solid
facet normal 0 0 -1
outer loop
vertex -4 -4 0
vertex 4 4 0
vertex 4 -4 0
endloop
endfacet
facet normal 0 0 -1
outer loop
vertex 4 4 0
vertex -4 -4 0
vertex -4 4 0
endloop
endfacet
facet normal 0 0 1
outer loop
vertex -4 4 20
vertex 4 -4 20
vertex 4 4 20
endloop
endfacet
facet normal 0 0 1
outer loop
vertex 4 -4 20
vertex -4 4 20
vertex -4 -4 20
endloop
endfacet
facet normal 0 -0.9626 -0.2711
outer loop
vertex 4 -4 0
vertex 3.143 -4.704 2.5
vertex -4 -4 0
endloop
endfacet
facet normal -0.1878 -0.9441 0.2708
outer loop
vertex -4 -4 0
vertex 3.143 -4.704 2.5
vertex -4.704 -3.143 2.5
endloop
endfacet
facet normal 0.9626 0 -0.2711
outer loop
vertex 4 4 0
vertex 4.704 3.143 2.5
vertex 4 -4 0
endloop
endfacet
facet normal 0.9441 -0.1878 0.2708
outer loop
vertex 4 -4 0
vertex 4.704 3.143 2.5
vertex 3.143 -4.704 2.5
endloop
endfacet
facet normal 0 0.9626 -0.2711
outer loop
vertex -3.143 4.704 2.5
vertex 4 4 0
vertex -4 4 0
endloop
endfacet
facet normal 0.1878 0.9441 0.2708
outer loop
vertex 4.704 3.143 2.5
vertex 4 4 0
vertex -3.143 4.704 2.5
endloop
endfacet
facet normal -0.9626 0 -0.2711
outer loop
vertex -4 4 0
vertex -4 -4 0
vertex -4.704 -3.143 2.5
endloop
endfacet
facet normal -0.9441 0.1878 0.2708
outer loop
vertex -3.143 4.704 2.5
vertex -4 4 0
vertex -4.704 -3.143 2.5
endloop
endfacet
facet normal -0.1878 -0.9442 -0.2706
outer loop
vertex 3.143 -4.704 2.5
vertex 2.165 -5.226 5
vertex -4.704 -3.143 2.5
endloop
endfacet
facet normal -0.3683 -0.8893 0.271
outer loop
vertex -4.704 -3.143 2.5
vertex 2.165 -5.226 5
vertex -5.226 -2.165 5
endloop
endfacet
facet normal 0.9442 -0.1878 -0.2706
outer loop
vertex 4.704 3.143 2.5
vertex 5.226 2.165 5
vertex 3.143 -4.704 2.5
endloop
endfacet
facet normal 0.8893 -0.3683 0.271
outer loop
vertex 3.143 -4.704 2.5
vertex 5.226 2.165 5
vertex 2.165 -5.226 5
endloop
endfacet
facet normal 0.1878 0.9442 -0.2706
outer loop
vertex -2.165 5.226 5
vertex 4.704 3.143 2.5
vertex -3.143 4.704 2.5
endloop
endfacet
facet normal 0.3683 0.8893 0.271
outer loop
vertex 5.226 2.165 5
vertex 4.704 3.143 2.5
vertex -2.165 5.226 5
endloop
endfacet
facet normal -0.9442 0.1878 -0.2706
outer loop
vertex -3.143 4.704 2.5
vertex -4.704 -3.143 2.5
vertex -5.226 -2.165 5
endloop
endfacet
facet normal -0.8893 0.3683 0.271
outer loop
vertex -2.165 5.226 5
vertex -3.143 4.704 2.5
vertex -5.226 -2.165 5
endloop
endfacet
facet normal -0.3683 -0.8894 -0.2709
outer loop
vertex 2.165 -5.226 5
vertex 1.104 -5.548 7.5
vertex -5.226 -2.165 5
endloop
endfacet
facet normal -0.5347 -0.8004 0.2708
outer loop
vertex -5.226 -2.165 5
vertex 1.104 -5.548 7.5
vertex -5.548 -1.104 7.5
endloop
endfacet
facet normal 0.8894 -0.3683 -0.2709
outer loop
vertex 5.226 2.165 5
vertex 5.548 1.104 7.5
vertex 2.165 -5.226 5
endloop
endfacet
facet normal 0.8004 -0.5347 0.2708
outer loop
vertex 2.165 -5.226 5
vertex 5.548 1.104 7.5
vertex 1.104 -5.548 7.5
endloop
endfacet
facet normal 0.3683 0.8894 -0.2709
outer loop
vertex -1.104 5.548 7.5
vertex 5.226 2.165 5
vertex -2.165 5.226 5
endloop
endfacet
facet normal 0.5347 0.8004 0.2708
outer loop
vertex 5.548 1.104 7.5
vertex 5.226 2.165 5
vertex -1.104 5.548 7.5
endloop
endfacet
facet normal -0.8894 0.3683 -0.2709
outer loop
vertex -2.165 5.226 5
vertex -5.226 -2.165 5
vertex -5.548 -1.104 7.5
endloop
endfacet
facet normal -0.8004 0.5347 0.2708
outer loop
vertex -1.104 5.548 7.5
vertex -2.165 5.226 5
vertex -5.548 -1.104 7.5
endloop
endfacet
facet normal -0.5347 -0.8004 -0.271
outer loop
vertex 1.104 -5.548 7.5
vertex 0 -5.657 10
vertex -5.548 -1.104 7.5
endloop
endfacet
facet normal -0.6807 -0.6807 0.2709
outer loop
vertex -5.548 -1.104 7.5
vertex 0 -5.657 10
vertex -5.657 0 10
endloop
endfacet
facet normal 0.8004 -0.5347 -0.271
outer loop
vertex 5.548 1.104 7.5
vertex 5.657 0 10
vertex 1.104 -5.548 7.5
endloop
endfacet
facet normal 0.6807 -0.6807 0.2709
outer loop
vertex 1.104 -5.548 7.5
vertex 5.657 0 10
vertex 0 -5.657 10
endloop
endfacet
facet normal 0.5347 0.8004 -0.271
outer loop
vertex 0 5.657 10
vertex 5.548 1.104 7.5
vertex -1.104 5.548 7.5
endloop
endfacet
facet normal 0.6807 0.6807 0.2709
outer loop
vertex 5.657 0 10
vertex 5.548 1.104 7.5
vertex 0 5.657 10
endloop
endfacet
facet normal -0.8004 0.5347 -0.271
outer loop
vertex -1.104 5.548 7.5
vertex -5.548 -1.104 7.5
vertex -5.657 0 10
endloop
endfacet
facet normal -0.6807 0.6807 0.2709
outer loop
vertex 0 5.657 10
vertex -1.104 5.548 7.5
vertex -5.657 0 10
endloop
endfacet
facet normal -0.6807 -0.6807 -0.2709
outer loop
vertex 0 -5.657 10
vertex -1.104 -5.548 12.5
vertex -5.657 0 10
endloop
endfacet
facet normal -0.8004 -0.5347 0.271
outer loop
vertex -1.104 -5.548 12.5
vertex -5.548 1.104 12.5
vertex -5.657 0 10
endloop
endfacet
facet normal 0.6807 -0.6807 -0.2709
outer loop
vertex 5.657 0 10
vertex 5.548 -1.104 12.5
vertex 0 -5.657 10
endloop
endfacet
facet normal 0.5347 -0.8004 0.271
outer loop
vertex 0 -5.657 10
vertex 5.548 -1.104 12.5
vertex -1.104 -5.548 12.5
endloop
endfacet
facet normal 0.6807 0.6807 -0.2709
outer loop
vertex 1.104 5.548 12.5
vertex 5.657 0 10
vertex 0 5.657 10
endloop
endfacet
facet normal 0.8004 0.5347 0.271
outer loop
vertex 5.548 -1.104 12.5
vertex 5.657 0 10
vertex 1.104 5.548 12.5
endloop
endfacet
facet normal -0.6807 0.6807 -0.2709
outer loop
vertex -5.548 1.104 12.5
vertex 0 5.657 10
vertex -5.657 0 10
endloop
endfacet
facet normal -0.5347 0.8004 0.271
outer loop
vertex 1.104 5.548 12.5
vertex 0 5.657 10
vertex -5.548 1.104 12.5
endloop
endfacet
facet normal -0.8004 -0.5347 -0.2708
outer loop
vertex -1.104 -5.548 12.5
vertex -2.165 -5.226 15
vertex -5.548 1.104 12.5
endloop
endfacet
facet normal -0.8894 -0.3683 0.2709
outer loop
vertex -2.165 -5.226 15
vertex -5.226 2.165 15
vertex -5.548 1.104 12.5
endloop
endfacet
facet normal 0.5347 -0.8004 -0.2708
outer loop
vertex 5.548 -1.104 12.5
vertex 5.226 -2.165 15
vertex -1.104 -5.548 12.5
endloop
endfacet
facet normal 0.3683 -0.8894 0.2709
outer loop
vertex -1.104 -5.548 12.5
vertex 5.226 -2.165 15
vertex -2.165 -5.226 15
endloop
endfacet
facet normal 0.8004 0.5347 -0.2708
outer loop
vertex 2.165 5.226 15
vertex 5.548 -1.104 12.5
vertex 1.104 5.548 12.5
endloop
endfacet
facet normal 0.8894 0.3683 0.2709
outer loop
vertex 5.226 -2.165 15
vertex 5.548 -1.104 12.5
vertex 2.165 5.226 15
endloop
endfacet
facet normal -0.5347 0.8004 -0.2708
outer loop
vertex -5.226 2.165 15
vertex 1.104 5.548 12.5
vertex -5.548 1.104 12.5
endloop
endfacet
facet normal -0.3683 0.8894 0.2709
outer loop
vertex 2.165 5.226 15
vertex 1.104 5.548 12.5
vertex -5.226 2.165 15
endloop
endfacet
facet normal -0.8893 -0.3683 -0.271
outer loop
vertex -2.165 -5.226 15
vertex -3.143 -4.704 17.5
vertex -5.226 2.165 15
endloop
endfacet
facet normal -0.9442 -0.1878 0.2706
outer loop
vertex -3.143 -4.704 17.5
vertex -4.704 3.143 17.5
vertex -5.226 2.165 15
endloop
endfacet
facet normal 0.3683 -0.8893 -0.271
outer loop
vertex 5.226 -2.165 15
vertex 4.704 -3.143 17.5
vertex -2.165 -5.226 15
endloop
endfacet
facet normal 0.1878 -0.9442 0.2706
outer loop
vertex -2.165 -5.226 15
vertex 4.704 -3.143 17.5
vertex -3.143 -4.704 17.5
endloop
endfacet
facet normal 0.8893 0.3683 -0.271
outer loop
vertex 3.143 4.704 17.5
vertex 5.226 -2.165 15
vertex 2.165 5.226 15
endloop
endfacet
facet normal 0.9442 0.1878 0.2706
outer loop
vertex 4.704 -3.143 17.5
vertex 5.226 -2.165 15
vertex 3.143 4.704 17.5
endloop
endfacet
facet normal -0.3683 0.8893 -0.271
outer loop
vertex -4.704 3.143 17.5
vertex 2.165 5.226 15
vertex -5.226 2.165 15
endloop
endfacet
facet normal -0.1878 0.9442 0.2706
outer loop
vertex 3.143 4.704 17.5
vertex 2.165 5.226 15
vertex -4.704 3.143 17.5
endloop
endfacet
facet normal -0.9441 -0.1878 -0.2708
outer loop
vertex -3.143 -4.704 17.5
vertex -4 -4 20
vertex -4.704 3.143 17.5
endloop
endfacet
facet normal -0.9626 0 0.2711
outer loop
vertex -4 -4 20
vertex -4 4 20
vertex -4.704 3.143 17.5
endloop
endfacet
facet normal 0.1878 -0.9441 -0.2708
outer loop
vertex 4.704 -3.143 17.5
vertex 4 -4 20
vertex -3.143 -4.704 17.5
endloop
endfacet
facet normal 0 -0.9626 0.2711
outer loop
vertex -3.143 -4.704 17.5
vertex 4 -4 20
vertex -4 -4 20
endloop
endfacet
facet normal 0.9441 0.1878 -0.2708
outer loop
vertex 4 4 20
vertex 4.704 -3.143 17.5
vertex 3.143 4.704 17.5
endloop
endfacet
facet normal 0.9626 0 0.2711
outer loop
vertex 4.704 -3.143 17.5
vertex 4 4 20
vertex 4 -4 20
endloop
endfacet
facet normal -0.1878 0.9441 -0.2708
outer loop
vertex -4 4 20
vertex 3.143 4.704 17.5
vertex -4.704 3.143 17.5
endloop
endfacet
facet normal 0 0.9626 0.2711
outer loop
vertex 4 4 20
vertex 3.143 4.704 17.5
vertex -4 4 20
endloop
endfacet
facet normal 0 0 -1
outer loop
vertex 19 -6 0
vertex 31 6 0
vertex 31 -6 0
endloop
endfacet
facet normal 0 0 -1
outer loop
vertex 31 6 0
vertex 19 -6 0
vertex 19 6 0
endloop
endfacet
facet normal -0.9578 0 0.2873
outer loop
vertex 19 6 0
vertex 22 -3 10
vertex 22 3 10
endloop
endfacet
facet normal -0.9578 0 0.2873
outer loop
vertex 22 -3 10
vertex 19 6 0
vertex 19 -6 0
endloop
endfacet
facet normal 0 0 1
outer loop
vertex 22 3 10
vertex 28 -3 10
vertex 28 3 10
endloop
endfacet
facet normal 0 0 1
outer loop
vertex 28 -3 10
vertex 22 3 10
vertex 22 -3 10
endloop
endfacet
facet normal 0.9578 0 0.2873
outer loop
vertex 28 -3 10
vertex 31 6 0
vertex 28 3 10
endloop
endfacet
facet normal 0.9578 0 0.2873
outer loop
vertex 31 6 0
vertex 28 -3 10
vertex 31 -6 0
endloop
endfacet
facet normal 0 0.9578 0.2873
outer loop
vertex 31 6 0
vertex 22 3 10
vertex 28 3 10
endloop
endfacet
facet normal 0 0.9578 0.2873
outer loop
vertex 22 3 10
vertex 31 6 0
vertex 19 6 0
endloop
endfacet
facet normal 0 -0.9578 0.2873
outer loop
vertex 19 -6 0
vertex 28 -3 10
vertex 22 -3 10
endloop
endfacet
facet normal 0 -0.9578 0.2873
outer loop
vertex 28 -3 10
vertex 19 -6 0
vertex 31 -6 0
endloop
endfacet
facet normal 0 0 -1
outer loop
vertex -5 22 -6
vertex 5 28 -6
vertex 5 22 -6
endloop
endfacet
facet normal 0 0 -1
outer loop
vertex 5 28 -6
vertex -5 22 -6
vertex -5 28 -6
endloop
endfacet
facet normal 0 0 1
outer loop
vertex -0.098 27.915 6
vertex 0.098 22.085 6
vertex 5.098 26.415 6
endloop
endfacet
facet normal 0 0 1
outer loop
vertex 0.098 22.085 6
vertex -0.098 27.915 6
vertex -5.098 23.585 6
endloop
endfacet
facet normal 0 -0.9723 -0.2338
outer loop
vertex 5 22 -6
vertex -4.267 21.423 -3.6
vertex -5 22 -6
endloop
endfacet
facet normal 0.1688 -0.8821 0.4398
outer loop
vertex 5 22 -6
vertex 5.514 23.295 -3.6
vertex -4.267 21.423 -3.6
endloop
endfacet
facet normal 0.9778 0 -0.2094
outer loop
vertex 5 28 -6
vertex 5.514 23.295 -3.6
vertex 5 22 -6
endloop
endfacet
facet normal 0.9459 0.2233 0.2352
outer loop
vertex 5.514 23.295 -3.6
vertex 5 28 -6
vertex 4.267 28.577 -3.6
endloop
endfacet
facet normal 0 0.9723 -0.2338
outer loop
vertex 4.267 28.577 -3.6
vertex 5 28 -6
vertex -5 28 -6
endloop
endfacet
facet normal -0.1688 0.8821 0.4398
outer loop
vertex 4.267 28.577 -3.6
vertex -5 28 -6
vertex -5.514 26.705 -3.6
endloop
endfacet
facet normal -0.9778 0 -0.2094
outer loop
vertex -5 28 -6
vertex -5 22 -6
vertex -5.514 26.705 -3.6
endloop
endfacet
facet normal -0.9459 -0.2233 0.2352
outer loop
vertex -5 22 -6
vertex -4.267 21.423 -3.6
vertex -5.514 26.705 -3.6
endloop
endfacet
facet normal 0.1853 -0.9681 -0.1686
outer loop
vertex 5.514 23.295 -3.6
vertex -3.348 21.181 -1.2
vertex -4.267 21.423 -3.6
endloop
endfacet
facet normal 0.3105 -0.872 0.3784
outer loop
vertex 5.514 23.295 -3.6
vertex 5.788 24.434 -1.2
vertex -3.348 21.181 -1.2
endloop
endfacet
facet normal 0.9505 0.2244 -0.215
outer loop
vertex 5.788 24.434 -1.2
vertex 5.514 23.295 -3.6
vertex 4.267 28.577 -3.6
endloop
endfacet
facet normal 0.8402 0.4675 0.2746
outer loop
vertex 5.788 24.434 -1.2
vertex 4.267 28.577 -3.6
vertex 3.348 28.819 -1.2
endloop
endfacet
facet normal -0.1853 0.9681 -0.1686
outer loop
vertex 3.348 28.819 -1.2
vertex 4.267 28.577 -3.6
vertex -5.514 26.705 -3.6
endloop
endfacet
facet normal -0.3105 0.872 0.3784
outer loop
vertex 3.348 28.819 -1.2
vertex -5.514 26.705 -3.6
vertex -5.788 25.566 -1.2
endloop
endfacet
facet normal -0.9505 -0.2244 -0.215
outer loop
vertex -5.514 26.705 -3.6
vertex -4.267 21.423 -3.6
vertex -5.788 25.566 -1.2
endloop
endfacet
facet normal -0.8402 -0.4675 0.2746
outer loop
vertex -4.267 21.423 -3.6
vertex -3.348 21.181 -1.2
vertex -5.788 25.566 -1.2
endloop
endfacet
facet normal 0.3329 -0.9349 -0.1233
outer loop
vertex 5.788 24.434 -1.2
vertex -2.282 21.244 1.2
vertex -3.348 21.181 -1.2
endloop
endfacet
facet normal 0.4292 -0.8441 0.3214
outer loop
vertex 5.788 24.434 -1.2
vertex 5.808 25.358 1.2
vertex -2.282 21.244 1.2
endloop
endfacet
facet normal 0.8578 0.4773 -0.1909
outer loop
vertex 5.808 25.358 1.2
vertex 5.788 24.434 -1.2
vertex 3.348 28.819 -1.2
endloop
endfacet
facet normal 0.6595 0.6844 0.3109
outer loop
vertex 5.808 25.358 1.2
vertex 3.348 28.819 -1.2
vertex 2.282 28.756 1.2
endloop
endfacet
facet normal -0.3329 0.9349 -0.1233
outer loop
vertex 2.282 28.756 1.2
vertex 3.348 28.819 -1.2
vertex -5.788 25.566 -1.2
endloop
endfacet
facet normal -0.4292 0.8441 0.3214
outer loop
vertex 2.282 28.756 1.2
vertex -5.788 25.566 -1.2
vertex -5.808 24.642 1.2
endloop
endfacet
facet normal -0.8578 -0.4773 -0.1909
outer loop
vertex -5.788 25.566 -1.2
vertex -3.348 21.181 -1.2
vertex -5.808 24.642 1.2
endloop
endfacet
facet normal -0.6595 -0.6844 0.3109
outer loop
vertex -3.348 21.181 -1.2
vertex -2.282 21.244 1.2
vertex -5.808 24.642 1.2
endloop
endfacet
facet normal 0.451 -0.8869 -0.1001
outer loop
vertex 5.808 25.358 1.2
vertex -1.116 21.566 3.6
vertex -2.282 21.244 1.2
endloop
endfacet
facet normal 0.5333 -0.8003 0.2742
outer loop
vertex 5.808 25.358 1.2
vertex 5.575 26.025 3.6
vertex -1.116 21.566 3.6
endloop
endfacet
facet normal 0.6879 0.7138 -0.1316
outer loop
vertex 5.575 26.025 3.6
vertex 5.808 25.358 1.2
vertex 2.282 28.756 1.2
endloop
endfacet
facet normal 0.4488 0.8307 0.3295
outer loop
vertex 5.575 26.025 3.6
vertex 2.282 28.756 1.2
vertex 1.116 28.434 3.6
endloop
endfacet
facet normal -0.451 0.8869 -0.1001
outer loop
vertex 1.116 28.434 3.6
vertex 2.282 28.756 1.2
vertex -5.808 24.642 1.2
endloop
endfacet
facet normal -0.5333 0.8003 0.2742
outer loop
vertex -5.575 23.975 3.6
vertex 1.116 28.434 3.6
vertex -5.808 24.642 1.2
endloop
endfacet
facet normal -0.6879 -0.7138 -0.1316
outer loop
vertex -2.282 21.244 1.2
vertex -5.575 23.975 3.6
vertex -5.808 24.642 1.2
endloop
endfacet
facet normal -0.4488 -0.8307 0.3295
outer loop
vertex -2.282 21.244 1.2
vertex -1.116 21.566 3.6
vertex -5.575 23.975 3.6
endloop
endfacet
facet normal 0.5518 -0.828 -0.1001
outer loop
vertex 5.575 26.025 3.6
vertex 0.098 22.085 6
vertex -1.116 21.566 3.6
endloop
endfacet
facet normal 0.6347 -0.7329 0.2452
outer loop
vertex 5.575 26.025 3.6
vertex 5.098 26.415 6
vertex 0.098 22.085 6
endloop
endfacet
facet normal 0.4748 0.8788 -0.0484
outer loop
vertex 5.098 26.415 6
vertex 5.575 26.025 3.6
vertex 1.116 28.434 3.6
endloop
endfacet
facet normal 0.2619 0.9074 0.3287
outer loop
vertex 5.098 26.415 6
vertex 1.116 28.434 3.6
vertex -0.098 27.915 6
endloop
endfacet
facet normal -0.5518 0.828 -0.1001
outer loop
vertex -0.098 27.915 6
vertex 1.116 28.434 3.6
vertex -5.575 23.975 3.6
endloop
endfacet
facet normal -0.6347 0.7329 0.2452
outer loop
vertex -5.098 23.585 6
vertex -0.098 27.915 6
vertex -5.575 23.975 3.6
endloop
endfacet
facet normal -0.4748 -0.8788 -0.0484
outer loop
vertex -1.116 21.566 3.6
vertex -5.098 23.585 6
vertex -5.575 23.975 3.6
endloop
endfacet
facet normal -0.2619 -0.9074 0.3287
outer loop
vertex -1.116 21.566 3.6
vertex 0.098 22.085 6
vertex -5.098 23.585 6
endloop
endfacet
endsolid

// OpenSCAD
// Zweck: linear_extrude mit twist und scale – gedrehter Stab und verjüngter Sockel.
linear_extrude(height = 20, twist = 90) square(8, center = true);
translate([25, 0, 0]) linear_extrude(height = 10, scale = 0.5) square(12, center = true);
translate([0, 25, 0])
    linear_extrude(height = 12, twist = -60, scale = [1, 0.5], center = true) square([10, 6], center = true);
